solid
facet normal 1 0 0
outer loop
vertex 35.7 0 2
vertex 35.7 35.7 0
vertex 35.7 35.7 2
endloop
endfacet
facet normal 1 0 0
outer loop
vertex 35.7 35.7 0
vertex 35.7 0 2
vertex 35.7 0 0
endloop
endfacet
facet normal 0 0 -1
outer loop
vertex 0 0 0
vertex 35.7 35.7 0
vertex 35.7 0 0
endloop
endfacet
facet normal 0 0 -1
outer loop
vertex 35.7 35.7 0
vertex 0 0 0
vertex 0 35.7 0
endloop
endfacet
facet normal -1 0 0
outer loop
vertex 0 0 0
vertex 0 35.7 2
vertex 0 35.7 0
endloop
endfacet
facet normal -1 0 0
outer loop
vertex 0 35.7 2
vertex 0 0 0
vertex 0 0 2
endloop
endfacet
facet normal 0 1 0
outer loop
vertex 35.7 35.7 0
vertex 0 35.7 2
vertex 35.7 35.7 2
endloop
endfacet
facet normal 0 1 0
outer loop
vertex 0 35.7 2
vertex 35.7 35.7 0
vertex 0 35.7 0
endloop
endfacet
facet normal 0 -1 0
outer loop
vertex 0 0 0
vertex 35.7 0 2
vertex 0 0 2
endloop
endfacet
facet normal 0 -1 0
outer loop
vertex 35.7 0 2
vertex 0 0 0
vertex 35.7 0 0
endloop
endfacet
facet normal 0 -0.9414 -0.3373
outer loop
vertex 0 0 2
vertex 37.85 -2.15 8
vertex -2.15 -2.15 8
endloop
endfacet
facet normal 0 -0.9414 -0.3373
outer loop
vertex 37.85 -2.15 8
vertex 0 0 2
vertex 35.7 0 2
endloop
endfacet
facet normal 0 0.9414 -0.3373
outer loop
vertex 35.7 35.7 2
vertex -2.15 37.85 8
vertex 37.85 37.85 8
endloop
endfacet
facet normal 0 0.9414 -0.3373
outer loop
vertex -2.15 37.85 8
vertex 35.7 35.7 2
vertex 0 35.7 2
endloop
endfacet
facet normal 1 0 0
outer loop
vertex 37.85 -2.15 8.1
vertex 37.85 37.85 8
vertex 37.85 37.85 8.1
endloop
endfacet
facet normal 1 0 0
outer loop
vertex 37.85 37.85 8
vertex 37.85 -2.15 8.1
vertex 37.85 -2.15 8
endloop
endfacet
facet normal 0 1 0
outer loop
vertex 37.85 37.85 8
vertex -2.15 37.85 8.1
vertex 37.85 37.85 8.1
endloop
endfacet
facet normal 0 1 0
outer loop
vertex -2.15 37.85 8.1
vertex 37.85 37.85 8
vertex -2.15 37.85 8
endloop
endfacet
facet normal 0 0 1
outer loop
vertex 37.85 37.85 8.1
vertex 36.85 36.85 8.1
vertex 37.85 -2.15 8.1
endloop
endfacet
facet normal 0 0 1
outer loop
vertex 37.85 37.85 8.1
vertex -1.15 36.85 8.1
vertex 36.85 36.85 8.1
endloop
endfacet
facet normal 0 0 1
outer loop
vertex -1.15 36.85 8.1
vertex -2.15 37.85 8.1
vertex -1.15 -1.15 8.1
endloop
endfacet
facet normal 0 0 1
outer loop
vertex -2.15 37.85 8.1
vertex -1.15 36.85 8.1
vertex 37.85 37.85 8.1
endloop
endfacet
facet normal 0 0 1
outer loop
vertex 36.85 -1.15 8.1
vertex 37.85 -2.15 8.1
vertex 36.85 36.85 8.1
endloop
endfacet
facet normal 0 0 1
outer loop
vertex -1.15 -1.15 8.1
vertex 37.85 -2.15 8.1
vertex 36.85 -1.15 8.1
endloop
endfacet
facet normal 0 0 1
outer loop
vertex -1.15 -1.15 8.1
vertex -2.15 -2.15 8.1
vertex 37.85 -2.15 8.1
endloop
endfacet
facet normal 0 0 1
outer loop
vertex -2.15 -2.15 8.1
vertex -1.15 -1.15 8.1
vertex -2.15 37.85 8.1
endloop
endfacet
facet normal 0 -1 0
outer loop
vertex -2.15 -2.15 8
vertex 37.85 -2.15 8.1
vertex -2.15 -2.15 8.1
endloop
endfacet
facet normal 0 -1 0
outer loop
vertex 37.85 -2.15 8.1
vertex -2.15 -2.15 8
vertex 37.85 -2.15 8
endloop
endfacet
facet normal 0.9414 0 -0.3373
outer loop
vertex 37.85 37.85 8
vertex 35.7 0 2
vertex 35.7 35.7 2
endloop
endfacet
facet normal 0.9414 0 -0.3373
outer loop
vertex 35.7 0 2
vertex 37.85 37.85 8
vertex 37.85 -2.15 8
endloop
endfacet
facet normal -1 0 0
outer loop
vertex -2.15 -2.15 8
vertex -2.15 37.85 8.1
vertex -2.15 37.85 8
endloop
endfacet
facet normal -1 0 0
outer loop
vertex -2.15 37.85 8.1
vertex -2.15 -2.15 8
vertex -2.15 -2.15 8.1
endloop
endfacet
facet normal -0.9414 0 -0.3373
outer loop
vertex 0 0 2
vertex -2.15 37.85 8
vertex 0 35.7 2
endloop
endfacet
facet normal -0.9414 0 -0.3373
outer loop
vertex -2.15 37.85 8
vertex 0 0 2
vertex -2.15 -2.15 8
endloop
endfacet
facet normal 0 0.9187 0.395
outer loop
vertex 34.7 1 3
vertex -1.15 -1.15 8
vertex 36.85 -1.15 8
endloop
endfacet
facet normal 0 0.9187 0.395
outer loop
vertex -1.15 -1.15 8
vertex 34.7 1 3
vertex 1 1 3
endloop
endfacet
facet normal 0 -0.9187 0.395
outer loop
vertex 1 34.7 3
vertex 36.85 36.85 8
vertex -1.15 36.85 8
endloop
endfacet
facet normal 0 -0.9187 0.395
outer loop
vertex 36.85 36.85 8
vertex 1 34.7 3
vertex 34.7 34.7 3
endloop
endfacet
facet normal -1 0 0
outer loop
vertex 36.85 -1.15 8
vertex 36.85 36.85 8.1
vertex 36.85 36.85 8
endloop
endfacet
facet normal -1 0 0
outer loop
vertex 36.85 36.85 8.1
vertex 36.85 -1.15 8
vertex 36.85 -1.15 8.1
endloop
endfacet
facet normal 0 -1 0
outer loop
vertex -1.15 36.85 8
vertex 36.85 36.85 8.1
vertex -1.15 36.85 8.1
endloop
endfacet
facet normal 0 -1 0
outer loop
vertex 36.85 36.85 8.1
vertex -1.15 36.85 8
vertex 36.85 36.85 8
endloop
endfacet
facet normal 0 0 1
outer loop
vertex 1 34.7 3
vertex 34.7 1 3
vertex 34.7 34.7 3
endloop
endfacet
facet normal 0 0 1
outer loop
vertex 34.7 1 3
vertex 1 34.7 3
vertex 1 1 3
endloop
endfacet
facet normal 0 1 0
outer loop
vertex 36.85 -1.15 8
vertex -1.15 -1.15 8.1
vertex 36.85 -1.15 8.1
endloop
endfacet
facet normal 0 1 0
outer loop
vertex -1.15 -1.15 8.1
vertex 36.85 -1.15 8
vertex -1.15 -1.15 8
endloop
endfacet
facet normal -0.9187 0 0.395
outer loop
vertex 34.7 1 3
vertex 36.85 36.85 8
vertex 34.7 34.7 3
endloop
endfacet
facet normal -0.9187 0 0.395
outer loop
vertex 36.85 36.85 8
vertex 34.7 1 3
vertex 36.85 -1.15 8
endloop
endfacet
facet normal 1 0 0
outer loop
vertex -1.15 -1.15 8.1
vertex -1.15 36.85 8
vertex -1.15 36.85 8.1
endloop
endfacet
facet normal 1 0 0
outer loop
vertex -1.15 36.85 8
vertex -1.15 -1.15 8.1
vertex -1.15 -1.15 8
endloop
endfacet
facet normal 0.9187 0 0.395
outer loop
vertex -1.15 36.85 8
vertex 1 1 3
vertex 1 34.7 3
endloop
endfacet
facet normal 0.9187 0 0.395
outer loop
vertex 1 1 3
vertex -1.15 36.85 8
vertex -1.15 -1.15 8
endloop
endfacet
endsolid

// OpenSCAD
// Parameters
bottom_thickness = 2;
wall_thickness = 1;
height = 8;
top_size = 40;
bottom_size = 35.7;

// Derived parameter
wall_height = height - bottom_thickness;

// Outer shell with absolute coordinates (origin at bottom corner)
module trapezoid_shell(top_len, bottom_len, wall_height) {
    hull() {
        // Bottom square at z = bottom_thickness (starting just above bottom plate)
        translate([0, 0, bottom_thickness])
            linear_extrude(0.1)
                square([bottom_len, bottom_len]);
        // Top square at z = height, properly aligned over bottom
        translate([(bottom_len - top_len)/2, (bottom_len - top_len)/2, height])
            linear_extrude(0.1)
                square([top_len, top_len]);
    }
}

// Inner void to subtract (create hollow)
module inner_void(inner_top, inner_bottom) {
    hull() {
        translate([wall_thickness, wall_thickness, bottom_thickness + wall_thickness])
            linear_extrude(0.1)
                square([inner_bottom, inner_bottom]);
        translate([(inner_bottom - inner_top)/2 + wall_thickness, (inner_bottom - inner_top)/2 + wall_thickness, height])
            linear_extrude(0.1)
                square([inner_top, inner_top]);
    }
}

// Final shape
difference() {
    union() {
        // Bottom plate at z = 0 (no centering, absolute coordinate)
        cube([bottom_size, bottom_size, bottom_thickness]);
        // Outer angled wall shell starting directly above bottom plate (no gap)
        trapezoid_shell(top_size, bottom_size, wall_height);
    }

    // Inner hollow (subtracted)
    inner_top = top_size - 2 * wall_thickness;
    inner_bottom = bottom_size - 2 * wall_thickness;
    inner_void(inner_top, inner_bottom);
}
